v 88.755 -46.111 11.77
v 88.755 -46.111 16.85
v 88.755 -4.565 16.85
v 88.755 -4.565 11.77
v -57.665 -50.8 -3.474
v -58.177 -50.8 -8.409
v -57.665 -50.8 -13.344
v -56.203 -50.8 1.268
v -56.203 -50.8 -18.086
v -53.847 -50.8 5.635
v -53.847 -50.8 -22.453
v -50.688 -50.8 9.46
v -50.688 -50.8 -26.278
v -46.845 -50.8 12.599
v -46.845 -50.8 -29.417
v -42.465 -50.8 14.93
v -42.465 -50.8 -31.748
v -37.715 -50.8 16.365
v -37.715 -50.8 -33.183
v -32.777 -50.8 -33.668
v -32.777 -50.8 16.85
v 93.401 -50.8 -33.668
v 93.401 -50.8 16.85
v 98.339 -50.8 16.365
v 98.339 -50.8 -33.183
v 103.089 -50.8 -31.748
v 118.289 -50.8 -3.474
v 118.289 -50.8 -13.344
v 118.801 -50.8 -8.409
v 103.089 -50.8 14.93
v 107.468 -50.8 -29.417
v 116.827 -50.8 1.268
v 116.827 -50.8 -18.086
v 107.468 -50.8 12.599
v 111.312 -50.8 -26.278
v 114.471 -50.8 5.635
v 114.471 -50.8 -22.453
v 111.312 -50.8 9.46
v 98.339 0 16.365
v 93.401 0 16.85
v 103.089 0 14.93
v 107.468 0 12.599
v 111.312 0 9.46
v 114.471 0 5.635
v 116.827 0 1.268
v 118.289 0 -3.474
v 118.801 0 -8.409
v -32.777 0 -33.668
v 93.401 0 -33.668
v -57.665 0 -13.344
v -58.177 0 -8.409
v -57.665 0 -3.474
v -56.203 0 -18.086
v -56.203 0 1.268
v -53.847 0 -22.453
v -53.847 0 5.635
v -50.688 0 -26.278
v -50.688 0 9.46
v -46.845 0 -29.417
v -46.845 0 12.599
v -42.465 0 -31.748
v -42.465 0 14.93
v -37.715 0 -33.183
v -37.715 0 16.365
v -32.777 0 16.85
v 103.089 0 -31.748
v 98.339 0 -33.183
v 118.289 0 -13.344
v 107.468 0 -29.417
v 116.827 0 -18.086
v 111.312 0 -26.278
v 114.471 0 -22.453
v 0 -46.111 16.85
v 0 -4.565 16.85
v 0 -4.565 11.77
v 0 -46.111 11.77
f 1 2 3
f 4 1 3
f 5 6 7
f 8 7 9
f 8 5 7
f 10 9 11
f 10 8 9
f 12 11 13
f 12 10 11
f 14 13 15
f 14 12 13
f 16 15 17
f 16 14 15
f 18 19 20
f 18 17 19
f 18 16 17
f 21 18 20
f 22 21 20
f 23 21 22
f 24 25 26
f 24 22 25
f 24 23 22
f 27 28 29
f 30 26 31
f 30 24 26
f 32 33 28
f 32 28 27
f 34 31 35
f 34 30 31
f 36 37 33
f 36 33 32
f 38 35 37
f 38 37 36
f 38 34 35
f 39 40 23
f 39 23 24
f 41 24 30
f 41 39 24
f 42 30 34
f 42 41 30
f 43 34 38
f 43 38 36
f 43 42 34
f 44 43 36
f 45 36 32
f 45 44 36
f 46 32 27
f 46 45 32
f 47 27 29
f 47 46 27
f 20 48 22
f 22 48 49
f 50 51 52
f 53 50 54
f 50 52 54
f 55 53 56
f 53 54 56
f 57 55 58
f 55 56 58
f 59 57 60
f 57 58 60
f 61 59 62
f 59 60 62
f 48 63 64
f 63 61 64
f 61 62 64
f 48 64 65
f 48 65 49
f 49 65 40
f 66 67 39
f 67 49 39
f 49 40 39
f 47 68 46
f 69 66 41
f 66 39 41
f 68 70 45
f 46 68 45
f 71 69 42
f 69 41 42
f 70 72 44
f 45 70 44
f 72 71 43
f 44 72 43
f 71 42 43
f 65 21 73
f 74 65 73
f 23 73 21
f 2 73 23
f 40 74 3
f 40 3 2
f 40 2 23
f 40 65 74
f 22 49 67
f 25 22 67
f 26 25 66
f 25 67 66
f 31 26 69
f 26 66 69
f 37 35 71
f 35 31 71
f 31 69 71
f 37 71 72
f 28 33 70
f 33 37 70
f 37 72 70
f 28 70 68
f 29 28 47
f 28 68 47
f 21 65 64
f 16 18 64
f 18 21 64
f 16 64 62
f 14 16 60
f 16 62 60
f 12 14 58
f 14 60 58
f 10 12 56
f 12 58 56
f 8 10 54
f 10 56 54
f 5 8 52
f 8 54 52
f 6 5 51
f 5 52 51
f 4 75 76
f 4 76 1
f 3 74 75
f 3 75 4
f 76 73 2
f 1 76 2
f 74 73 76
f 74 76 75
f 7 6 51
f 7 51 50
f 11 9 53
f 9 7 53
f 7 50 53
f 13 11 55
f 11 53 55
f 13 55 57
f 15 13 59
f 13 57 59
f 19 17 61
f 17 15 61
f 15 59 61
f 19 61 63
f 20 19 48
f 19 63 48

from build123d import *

# Parameters (mm, degrees)
F0_W        = 176.9779659808
F0_H        = 50.5181439221
F1_DEPTH    = 50.8
F2_T1_DEPTH = 177.8
F3_W        = 88.7552052736
F3_H        = 41.5458488278
F4_DEPTH    = 5.08


# Not quite as in the source:
# - a fillet or chamfer that OpenCascade refuses, or shapes differently, is made with other operations: its cross-section is extruded or revolved along the edge and cut away or added


with BuildPart() as f1:
    # F0 (on Front) → F1 (new body)
    with BuildSketch(Plane.XZ):
        with Locations((30.3119476885, -8.4089655429)):
            Rectangle(F0_W, F0_H)
    extrude(amount=F1_DEPTH)

    # F2: fillet of radius 25.4 on 4 edges, made by hand

    # F2_s2 → F2_t1 (cut)
    with BuildSketch(Plane.XZ.offset(-63.5)):
        with BuildLine():
            ThreePointArc((-32.7770353019, 16.8501064181), (-50.7375475441, 9.4106186603), (-58.1770353019, -8.5498935819))
            Line((-58.1770353019, -8.5498935819), (-58.1770353019, 16.8501064181))
            Line((-58.1770353019, 16.8501064181), (-32.7770353019, 16.8501064181))
        make_face()
        with BuildLine():
            ThreePointArc((-58.1770353019, -8.268037504), (-50.7375475441, -26.2285497461), (-32.7770353019, -33.668037504))
            Line((-32.7770353019, -33.668037504), (-58.1770353019, -33.668037504))
            Line((-58.1770353019, -33.668037504), (-58.1770353019, -8.268037504))
        make_face()
        with BuildLine():
            ThreePointArc((93.4009306788, 16.8501064181), (111.361442921, 9.4106186603), (118.8009306788, -8.5498935819))
            Line((118.8009306788, -8.5498935819), (118.8009306788, 16.8501064181))
            Line((118.8009306788, 16.8501064181), (93.4009306788, 16.8501064181))
        make_face()
        with BuildLine():
            ThreePointArc((93.4009306788, -33.668037504), (111.361442921, -26.2285497461), (118.8009306788, -8.268037504))
            Line((118.8009306788, -8.268037504), (118.8009306788, -33.668037504))
            Line((118.8009306788, -33.668037504), (93.4009306788, -33.668037504))
        make_face()
    extrude(amount=F2_T1_DEPTH, mode=Mode.SUBTRACT)

    # F3 (on face) → F4 (cut)
    with BuildSketch(Plane.XY.offset(16.8501064181)):
        with Locations((44.3776026368, -25.3384022508)):
            Rectangle(F3_W, F3_H)
    extrude(amount=-F4_DEPTH, mode=Mode.SUBTRACT)


solid = f1.part
